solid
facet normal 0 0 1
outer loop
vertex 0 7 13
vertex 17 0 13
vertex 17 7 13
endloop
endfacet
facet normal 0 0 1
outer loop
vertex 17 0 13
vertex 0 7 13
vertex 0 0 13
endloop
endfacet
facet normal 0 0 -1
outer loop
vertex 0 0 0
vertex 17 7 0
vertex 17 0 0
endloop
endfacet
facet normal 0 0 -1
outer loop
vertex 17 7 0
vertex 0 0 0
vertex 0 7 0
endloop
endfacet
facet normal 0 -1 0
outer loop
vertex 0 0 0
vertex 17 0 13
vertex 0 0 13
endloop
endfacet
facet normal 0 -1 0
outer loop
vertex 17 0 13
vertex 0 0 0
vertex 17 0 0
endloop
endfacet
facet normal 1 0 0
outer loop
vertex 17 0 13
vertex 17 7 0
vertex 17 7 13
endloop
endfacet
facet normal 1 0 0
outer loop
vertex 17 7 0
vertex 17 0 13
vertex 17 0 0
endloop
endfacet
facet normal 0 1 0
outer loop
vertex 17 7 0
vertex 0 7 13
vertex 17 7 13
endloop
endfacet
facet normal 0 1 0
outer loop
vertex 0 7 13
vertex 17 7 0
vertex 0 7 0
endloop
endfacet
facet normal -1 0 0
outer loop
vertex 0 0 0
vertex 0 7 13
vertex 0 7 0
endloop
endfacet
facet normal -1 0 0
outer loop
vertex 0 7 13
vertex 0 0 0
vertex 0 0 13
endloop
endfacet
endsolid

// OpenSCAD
// Generated by SolidPython 1.0.1 on 2020-07-29 00:46:56


cube(size = [17, 7, 13]);
/***********************************************
*********      SolidPython code:      **********
************************************************
 
# import packages: SolidPython
from solid import *
from solid.utils import *
from itertools import chain, combinations, permutations


class Resize:

    def __init__(self, scad_file):
        self.scad_file = scad_file
        #self.scad_file = import_scad(scad_file)
        # cone/cylinder param:
        self.r1 = 0
        self.r2 = 0
        self.h = 0
        # rectangular prism param:
        self.w = 0
        self.l = 0
        # ellipse param:
        self.r = 0

    # import OpenScad code (file name corresponds to shape)


    # classify shape + parameters
    def assign(self, param1, param2, param3):
        if self.scad_file == 'cone.scad':
            self.r1 = param1
            self.r2 = param2
            self.h = param3
        elif self.scad_file == 'cylinder.scad':
            self.r1 = param1
            self.r2 = param2
            self.h = param3
        elif self.scad_file == 'rectangularPrism.scad':
            self.h = param1
            self.l = param2
            self.w = param3
        else:
            self.r = param1
            self.h = param2

    # resize parameters
    def iterate(self):
        x = range(3, 20, 2)
        i = 1
        if self.scad_file == 'cone.scad':
            tempList = list(permutations(x, 2))
            for temp in tempList:
                param1 = temp[0]
                param2 = temp[1]
                filepath = 'produced_scad_files/' + 'cone' + str(param1) + '_' + str(param2) + '_' + '.scad'
                scad_render_to_file(cylinder(h=param1, r1=param2, r2=0), filepath)

        elif self.scad_file == 'cylinder.scad':
            tempList = list(permutations(x, 3))
            for temp in tempList:
                param1 = temp[0]
                param2 = temp[1]
                filepath = 'produced_scad_files/' + 'cylinder' + str(param1) + '_' + str(param2) + '_' + '.scad'
                scad_render_to_file(cylinder(h=param1, r1=param2, r2=param2), filepath)

        elif self.scad_file == 'rectangularPrism.scad':
            tempList = list(permutations(x, 3))
            for temp in tempList:
                param1 = temp[0]
                param2 = temp[1]
                param3 = temp[2]
                filepath = 'produced_scad_files/' + 'rectangularPrism' + str(param1) + '_' + str(param2) + '_' + str(
                    param3) + '.scad'
                scad_render_to_file(cube(size=(param1, param2, param3)), filepath)

        elif self.scad_file == 'ellipse.scad':
            tempList = list(permutations(x, 4))
            for temp in tempList:
                param1 = temp[0]
                param2 = temp[1]
                param3 = temp[2]
                param4 = temp[3]
                filepath = 'produced_scad_files/' + 'ellipse' + str(param1) + '_' + str(param2) + '_' + str(param3) + '_' + str(param4) + '.scad'
                scad_render_to_file(scale([param1, param2, param3])(sphere(r=param4)), filepath)

    def render_to_scadfile(self):
        scad_render_to_file(scad, 'example.scad') 
 
************************************************/
